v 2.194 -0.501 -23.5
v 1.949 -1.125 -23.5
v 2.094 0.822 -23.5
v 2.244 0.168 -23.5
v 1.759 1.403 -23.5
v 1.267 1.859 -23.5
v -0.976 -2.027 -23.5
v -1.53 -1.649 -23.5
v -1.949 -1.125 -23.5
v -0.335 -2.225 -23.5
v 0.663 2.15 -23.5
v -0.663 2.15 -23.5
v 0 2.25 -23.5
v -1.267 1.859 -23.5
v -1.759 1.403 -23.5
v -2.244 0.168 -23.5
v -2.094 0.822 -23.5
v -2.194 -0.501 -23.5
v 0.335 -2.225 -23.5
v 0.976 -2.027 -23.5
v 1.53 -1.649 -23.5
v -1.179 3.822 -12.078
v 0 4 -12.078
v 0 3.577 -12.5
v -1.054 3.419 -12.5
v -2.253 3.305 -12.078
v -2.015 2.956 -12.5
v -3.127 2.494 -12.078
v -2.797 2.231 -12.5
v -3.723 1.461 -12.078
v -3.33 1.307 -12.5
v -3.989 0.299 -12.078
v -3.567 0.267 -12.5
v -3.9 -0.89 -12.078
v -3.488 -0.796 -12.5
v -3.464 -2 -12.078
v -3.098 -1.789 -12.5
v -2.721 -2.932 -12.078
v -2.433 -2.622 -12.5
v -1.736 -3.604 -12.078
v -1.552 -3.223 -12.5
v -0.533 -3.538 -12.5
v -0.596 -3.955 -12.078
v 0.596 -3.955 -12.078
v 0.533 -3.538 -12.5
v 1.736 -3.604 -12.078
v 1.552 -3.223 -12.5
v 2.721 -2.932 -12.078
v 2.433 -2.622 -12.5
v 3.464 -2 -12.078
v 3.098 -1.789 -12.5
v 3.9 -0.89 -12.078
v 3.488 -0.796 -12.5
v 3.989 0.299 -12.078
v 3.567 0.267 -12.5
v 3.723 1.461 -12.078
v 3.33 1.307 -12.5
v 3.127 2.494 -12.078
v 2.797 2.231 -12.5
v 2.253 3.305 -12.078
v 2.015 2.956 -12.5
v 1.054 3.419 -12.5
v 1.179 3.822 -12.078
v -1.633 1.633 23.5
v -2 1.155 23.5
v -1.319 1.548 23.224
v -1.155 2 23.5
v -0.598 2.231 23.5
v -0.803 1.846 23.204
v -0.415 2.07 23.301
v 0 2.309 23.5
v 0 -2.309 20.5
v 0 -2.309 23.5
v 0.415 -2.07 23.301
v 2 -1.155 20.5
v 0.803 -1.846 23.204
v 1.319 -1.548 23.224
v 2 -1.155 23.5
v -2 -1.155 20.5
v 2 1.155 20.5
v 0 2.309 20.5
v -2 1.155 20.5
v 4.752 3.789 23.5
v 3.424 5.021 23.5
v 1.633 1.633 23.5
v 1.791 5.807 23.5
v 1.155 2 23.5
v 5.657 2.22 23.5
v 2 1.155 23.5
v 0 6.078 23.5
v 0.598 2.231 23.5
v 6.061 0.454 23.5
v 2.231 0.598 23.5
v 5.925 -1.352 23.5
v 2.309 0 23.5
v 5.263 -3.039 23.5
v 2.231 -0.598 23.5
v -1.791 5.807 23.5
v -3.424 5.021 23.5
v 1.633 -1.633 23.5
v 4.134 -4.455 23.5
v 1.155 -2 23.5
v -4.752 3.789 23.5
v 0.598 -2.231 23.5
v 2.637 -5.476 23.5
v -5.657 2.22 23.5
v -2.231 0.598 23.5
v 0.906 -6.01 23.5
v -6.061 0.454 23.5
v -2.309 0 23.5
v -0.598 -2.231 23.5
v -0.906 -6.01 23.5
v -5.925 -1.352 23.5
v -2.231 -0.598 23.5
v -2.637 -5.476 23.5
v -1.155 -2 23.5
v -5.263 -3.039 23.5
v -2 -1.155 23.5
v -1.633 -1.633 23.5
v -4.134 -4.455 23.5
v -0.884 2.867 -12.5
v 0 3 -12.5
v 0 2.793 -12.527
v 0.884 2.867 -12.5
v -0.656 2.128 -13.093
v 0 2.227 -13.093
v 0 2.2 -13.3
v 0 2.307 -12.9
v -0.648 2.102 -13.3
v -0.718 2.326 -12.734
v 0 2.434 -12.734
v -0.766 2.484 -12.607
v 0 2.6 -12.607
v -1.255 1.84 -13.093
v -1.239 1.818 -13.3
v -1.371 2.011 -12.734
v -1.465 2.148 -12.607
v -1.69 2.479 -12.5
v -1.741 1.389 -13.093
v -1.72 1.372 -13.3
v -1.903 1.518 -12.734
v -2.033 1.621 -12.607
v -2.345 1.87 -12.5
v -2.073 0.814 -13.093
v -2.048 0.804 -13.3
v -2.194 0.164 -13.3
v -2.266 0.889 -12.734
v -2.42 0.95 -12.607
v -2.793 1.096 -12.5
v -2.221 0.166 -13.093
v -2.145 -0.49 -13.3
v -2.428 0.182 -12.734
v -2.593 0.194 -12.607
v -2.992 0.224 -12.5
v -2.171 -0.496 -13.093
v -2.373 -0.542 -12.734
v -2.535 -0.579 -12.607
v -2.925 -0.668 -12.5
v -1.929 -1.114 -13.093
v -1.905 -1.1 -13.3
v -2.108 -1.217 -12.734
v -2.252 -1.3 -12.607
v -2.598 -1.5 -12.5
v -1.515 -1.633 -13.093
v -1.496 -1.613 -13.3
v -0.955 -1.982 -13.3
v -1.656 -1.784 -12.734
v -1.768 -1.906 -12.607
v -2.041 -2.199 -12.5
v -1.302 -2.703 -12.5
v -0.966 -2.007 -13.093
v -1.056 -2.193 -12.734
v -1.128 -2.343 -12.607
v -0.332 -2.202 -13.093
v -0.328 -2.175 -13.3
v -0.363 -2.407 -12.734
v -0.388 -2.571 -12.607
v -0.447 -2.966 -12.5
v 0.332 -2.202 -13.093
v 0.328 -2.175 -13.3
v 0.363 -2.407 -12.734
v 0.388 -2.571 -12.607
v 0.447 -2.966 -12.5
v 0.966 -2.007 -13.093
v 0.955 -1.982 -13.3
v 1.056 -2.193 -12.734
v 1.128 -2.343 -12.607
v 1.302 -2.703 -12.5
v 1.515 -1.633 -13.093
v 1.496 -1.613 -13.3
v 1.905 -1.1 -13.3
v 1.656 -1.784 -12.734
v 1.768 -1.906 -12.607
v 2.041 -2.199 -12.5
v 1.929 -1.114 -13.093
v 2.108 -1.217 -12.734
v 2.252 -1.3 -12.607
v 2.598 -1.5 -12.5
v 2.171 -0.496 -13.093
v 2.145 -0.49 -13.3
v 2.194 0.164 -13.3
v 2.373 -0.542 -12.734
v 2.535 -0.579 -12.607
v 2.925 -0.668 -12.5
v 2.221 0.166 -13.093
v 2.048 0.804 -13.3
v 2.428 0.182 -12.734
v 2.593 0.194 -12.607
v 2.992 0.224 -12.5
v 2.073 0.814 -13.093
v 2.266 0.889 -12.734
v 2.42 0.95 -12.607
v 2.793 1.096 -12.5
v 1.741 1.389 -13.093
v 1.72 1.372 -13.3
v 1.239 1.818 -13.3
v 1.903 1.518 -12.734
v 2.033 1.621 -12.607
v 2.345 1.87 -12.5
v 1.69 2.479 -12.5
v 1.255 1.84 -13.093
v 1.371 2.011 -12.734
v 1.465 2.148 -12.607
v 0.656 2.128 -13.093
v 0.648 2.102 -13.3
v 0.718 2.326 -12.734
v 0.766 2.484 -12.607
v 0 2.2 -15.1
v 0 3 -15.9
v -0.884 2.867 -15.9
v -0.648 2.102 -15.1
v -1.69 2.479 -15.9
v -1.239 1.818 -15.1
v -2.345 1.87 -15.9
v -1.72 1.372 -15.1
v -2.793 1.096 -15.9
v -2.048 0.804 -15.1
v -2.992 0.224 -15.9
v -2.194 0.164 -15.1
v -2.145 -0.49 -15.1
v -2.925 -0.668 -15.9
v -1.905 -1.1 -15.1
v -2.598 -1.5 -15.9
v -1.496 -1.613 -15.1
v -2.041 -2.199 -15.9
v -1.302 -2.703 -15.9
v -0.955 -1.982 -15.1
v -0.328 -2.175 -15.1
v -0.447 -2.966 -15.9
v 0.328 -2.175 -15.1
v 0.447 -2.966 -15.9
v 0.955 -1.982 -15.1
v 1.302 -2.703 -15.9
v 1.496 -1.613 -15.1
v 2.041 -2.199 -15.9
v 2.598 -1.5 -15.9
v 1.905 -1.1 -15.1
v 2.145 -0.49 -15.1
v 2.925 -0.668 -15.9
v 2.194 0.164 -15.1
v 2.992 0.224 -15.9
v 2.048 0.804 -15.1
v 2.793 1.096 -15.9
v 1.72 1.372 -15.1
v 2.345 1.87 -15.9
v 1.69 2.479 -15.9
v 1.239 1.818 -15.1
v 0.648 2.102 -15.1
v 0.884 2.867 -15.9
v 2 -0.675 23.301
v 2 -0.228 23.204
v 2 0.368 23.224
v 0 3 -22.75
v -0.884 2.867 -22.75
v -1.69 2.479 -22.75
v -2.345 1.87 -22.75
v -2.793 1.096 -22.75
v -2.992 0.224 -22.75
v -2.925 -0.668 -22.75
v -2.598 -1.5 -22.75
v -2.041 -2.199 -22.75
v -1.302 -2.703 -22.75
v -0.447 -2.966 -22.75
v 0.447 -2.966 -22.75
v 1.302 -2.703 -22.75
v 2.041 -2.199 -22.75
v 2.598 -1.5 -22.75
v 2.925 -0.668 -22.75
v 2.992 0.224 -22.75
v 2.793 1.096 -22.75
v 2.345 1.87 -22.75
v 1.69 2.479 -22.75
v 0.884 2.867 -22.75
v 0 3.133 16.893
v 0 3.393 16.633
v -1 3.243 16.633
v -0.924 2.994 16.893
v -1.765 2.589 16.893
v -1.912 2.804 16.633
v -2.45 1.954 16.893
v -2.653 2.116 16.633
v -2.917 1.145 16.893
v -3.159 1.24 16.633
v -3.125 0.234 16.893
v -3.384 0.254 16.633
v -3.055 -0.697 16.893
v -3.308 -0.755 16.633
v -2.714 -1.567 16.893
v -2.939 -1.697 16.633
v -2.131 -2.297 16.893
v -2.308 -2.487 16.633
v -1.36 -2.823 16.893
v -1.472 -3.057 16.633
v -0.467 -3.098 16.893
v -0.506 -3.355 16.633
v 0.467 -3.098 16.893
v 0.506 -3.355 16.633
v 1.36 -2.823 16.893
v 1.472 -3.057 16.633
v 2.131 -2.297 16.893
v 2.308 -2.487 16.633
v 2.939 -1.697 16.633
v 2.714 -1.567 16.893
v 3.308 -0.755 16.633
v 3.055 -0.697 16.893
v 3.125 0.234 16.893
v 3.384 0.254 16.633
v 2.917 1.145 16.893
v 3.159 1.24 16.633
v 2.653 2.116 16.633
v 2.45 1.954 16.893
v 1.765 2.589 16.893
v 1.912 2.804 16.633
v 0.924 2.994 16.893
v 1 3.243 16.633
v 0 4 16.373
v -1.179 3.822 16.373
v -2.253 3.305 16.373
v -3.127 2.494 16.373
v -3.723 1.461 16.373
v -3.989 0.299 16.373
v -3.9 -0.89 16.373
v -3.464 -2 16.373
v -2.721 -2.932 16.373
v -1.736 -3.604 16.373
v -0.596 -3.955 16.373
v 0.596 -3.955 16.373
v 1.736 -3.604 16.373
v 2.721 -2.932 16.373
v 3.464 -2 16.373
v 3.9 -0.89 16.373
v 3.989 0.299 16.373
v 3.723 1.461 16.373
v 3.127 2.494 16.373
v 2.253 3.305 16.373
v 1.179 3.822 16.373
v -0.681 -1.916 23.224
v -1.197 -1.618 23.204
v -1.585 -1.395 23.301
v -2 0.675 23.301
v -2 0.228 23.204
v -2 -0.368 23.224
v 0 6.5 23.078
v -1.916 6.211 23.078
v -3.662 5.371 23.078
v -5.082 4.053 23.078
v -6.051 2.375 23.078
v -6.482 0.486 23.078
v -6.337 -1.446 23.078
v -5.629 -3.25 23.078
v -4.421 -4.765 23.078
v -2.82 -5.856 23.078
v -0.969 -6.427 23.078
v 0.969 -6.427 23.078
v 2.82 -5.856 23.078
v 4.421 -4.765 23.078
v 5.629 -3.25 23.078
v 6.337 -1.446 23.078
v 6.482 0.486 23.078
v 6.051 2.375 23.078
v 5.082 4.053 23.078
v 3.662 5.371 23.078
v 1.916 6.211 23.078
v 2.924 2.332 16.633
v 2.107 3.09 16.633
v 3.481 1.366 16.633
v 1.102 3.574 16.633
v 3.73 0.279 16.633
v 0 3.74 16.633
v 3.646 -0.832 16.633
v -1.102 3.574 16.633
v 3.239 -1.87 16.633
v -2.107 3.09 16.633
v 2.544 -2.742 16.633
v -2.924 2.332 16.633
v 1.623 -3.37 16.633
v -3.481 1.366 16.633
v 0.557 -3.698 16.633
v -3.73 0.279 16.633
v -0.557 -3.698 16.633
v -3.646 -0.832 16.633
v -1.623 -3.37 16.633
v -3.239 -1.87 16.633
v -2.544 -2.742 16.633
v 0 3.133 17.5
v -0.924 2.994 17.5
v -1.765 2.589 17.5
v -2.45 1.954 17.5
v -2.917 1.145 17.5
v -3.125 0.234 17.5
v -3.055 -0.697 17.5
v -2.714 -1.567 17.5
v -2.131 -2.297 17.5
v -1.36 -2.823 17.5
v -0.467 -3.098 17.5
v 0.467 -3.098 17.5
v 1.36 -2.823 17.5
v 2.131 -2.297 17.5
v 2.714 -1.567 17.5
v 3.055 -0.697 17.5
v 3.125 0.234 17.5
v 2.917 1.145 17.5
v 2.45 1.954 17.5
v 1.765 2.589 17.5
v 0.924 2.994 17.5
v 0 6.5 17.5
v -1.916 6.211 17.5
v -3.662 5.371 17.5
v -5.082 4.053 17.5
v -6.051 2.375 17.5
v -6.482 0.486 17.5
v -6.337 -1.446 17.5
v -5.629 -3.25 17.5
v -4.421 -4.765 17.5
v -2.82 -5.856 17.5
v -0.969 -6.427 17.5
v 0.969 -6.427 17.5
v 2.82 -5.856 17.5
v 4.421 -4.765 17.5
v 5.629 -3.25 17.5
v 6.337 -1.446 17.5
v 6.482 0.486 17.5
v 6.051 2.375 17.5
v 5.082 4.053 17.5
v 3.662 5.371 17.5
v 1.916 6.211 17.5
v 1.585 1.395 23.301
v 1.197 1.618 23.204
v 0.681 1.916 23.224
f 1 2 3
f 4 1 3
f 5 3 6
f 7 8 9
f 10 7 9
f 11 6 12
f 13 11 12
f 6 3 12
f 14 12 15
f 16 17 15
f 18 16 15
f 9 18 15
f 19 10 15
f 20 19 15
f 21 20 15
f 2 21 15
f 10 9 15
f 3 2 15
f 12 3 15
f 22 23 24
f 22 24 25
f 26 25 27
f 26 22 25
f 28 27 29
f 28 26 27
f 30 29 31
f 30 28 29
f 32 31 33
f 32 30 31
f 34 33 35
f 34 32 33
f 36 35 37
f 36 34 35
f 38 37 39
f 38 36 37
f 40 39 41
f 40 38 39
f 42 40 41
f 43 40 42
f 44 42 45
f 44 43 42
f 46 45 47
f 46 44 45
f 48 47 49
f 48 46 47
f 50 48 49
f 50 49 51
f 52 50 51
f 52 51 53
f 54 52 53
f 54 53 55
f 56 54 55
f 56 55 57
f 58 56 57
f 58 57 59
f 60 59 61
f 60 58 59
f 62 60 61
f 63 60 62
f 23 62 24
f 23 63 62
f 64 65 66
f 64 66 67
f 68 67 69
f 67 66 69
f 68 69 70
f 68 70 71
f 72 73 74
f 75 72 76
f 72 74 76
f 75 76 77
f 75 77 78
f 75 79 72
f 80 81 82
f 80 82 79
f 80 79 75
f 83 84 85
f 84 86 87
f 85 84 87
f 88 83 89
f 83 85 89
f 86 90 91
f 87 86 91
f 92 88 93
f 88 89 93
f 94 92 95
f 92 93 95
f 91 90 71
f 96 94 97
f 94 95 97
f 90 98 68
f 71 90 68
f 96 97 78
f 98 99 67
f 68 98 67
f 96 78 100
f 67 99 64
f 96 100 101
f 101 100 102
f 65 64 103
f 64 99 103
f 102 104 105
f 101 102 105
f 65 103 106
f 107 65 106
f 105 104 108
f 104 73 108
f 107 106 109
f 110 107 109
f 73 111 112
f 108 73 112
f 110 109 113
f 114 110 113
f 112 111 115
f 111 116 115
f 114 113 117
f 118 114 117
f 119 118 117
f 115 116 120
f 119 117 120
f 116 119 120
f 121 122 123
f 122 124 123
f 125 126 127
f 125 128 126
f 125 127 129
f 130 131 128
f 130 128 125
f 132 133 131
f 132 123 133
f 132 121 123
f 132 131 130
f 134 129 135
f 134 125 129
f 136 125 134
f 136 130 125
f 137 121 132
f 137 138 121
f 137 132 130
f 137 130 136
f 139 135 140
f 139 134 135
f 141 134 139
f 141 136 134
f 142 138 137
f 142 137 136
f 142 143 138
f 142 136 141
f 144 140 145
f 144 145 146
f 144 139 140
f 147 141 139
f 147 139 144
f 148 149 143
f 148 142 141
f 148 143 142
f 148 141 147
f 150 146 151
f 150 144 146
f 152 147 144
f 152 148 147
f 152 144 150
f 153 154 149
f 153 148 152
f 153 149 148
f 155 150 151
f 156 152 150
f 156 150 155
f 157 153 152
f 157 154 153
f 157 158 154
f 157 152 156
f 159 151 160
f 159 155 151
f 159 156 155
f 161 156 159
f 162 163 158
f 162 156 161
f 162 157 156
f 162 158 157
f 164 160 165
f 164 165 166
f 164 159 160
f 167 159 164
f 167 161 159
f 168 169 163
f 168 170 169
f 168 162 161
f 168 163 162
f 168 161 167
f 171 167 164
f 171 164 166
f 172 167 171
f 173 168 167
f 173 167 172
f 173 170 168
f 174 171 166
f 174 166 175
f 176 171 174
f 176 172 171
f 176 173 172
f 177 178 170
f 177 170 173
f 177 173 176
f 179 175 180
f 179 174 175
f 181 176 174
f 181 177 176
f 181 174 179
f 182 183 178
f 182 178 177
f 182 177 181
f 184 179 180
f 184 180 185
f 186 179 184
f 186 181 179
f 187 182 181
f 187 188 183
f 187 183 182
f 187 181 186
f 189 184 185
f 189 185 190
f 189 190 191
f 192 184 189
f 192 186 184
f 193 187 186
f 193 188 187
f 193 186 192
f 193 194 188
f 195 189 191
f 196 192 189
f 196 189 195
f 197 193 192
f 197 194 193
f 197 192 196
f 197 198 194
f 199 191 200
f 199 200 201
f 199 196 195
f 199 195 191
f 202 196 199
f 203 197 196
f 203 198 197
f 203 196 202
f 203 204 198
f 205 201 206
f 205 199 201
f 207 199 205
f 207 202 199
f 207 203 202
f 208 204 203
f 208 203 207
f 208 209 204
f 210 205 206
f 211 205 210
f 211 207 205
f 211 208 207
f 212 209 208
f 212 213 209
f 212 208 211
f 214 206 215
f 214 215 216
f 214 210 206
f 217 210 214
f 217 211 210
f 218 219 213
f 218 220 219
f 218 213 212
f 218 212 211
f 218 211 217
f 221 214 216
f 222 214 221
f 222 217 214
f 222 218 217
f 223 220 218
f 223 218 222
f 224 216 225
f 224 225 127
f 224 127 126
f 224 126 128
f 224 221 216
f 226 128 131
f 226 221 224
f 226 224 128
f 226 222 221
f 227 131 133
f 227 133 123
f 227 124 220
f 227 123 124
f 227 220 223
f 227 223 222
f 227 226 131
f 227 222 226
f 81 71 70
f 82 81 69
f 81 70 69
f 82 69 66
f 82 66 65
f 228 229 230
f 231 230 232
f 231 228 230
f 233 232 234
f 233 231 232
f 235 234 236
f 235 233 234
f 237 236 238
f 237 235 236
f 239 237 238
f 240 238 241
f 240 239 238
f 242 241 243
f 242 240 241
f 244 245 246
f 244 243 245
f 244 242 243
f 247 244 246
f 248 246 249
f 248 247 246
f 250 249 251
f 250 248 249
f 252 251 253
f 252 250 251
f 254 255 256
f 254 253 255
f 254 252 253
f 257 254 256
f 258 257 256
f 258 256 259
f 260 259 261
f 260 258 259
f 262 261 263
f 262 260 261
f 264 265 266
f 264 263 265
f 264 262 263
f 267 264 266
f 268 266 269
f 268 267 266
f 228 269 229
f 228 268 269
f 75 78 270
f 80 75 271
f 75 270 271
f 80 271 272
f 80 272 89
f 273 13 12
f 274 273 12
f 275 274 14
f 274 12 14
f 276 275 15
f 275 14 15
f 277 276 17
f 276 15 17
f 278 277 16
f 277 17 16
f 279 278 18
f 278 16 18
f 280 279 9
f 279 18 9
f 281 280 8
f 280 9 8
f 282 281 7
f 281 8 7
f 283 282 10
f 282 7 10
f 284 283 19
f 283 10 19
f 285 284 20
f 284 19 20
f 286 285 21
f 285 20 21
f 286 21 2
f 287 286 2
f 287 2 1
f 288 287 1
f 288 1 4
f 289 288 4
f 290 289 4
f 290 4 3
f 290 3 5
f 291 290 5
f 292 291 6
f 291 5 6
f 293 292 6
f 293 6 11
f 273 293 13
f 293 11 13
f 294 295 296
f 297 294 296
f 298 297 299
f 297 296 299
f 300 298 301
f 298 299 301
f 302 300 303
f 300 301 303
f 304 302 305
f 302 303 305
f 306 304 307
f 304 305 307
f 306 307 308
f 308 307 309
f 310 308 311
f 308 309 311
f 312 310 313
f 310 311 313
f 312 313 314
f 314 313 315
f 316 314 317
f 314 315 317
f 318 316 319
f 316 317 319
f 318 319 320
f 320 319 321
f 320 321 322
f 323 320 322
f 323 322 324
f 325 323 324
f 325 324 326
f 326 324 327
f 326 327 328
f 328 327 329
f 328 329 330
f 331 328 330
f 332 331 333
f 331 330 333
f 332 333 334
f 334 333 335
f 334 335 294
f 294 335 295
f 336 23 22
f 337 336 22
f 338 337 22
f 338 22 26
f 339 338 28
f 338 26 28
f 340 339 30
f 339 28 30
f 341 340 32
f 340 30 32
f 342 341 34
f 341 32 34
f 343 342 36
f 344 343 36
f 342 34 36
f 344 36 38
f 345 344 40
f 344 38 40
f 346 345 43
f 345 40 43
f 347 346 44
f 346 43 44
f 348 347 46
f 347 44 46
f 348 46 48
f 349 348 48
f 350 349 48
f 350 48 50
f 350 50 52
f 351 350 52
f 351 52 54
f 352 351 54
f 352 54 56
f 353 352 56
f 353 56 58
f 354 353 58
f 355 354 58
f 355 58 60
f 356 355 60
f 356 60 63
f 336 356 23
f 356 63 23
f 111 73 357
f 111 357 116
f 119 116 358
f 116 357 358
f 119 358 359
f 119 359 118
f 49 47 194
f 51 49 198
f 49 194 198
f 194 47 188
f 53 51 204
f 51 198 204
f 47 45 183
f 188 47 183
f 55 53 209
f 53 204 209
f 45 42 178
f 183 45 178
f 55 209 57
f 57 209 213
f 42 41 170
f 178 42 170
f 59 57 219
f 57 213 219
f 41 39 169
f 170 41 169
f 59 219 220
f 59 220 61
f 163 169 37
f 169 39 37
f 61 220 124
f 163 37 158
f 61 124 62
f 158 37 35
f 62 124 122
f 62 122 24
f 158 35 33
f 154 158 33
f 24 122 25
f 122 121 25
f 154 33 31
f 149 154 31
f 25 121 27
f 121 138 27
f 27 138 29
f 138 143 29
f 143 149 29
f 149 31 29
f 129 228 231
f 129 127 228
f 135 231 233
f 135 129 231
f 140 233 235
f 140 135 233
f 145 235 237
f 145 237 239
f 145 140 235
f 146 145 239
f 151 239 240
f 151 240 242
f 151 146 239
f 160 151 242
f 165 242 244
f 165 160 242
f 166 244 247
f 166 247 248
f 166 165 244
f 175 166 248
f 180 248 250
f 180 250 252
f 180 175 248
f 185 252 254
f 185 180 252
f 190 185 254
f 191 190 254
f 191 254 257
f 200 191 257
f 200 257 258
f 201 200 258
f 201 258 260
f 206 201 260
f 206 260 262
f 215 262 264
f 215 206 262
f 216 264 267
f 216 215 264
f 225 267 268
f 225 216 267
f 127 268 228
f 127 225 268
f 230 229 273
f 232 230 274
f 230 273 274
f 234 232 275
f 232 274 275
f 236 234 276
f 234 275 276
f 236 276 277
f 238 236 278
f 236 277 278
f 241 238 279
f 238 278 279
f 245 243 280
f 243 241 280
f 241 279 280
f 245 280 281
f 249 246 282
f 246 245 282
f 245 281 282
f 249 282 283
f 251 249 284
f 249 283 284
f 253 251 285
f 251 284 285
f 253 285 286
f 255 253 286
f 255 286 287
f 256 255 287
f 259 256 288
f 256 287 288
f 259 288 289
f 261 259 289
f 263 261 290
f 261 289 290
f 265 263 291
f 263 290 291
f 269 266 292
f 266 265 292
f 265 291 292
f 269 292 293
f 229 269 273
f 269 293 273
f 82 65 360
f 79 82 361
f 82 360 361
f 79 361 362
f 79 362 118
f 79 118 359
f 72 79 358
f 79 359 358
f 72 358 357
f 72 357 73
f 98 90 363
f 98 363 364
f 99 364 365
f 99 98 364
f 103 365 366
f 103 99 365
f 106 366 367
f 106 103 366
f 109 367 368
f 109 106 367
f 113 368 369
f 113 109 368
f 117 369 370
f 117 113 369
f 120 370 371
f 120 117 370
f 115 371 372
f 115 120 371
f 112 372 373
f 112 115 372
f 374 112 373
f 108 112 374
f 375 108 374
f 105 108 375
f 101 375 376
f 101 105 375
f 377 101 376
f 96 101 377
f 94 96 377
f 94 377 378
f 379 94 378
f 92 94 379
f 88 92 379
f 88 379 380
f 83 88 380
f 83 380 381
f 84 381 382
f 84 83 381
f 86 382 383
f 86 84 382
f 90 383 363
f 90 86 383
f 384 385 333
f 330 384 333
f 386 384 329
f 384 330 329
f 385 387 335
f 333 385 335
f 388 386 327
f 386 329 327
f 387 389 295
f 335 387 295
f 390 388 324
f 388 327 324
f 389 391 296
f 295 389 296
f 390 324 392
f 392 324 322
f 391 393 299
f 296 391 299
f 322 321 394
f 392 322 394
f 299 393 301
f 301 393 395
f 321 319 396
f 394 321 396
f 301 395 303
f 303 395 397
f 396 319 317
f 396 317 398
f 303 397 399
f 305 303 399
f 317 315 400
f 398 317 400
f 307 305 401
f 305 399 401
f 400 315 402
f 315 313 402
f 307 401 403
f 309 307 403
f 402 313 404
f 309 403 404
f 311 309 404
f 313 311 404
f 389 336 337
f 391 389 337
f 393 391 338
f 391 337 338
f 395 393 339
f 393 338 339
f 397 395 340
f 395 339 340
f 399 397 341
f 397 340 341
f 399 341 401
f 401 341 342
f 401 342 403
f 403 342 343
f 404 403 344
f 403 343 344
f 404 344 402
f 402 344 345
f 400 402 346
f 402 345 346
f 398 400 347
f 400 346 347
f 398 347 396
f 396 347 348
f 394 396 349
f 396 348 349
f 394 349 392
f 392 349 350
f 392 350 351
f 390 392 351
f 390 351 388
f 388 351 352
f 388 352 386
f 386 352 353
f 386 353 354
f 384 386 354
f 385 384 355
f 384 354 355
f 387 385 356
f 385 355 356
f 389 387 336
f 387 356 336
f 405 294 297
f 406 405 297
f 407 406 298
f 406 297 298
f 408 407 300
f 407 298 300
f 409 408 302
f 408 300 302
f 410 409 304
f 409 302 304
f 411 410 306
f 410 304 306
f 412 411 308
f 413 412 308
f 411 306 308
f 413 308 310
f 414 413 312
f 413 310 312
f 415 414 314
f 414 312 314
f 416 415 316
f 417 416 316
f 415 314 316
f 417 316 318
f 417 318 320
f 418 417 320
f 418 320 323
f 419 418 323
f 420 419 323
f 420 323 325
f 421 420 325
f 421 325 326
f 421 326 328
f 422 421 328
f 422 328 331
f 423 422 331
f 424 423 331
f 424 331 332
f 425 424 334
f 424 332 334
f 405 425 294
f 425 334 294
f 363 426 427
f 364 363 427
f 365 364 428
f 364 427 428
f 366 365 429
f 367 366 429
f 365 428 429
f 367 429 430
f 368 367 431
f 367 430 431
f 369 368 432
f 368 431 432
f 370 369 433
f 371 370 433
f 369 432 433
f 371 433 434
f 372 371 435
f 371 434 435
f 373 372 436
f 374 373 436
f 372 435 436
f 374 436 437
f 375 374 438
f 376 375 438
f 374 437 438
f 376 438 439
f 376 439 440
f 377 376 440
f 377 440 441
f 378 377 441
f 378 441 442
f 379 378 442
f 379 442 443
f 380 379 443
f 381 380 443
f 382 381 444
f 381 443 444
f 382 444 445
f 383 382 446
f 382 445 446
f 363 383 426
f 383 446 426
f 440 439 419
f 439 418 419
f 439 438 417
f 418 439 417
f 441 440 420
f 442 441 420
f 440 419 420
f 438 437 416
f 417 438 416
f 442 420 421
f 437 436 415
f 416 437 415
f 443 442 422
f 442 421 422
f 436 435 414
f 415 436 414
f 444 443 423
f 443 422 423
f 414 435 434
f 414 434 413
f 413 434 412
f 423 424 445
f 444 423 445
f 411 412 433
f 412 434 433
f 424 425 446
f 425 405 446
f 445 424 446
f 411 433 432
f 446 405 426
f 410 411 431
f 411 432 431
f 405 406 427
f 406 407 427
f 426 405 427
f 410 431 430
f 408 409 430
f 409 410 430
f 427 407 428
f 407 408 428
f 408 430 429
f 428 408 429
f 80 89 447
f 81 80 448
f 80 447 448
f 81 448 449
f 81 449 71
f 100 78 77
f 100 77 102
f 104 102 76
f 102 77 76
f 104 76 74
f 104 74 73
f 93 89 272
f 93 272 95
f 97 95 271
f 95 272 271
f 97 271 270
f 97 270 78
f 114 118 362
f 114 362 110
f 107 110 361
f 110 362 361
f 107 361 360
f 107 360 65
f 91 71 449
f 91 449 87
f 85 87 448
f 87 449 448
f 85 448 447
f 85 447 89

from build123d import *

# Parameters (mm, degrees)
SKETCH4_W          = 0.866666667
SKETCH4_H          = 0.866666667
CHAMFER1_SIZE      = 0.26
CHAMFER2_SIZE      = 0.75
CHAMFER3_SIZE      = 0.4225
CUT_EXTRUDE1_DEPTH = 3


with BuildPart() as part:
    # Sketch3 → Revolve1 (revolve)
    with BuildSketch(Plane(origin=(0, 0, 0), x_dir=(0, 0, -1), z_dir=(1, 0, 0))):
        Polygon((-23.5, 6.5), (-17.5, 6.5), (-17.5, 4), (12.5, 4), (12.5, 3), (23.5, 3), (23.5, 0), (-23.5, 0), align=None)
    revolve(axis=Axis((0, 0, -23.5), (0, 0, 1)))

    # Sketch4 → Cut-Revolve1 (revolve, cut)
    with BuildSketch(Plane(origin=(0, 0, 0), x_dir=(0, 0, -1), z_dir=(1, 0, 0))):
        with Locations((-17.066666666, 3.566666667)):
            Rectangle(SKETCH4_W, SKETCH4_H)
    revolve(axis=Axis((0, 0, -23.5), (0, 0, 1)), mode=Mode.SUBTRACT)

    # Chamfer1
    chamfer1_edges = [part.edges().sort_by_distance(p)[0] for p in [
        (0, -3.133333333, 16.633333333),
        (0, -4, 16.633333333),
    ]]
    chamfer(chamfer1_edges, length=CHAMFER1_SIZE)

    # Sketch6 → Cut-Revolve2 (revolve, cut)
    with BuildSketch(Plane(origin=(0, 0, 0), x_dir=(0, 0, -1), z_dir=(1, 0, 0))):
        with BuildLine():
            Line((12.5, 4), (16.9, 4))
            Line((16.9, 4), (15.1, 2.2))
            Line((15.1, 2.2), (13.3, 2.2))
            ThreePointArc((13.3, 2.2), (12.734314575, 2.434314575), (12.5, 3))
            Line((12.5, 3), (12.5, 4))
        make_face()
    revolve(axis=Axis((0, 0, -23.5), (0, 0, 1)), mode=Mode.SUBTRACT)

    # Chamfer2
    chamfer2_edges = [part.edges().sort_by_distance(p)[0] for p in [
        (0, -3, -23.5),
    ]]
    chamfer(chamfer2_edges, length=CHAMFER2_SIZE)

    # Chamfer3
    chamfer3_edges = [part.edges().sort_by_distance(p)[0] for p in [
        (0, -4, -12.5),
        (0, -6.5, 23.5),
    ]]
    chamfer(chamfer3_edges, length=CHAMFER3_SIZE)

    # Sketch8 → Cut-Extrude1 (cut)
    with BuildSketch(Plane.XY.offset(23.5)):
        Polygon((2, 1.154700538), (0, 2.309401077), (-2, 1.154700538), (-2, -1.154700538), (0, -2.309401077), (2, -1.154700538), align=None)
    extrude(amount=-CUT_EXTRUDE1_DEPTH, mode=Mode.SUBTRACT)

    # Cut-Extrude2 cone 1 section (through the dimple's axis) → Cut-Extrude2 (revolve, cut)
    with BuildSketch(Plane(origin=(0, 0, 23.5), x_dir=(0, -1, 0), z_dir=(1, 0, 0))):
        Polygon((0, 0), (2.309401077, 0), (0, 2.309401077), align=None)
    revolve(axis=Axis((0, 0, 23.5), (0, 0, -1)), mode=Mode.SUBTRACT)


solid = part.part
